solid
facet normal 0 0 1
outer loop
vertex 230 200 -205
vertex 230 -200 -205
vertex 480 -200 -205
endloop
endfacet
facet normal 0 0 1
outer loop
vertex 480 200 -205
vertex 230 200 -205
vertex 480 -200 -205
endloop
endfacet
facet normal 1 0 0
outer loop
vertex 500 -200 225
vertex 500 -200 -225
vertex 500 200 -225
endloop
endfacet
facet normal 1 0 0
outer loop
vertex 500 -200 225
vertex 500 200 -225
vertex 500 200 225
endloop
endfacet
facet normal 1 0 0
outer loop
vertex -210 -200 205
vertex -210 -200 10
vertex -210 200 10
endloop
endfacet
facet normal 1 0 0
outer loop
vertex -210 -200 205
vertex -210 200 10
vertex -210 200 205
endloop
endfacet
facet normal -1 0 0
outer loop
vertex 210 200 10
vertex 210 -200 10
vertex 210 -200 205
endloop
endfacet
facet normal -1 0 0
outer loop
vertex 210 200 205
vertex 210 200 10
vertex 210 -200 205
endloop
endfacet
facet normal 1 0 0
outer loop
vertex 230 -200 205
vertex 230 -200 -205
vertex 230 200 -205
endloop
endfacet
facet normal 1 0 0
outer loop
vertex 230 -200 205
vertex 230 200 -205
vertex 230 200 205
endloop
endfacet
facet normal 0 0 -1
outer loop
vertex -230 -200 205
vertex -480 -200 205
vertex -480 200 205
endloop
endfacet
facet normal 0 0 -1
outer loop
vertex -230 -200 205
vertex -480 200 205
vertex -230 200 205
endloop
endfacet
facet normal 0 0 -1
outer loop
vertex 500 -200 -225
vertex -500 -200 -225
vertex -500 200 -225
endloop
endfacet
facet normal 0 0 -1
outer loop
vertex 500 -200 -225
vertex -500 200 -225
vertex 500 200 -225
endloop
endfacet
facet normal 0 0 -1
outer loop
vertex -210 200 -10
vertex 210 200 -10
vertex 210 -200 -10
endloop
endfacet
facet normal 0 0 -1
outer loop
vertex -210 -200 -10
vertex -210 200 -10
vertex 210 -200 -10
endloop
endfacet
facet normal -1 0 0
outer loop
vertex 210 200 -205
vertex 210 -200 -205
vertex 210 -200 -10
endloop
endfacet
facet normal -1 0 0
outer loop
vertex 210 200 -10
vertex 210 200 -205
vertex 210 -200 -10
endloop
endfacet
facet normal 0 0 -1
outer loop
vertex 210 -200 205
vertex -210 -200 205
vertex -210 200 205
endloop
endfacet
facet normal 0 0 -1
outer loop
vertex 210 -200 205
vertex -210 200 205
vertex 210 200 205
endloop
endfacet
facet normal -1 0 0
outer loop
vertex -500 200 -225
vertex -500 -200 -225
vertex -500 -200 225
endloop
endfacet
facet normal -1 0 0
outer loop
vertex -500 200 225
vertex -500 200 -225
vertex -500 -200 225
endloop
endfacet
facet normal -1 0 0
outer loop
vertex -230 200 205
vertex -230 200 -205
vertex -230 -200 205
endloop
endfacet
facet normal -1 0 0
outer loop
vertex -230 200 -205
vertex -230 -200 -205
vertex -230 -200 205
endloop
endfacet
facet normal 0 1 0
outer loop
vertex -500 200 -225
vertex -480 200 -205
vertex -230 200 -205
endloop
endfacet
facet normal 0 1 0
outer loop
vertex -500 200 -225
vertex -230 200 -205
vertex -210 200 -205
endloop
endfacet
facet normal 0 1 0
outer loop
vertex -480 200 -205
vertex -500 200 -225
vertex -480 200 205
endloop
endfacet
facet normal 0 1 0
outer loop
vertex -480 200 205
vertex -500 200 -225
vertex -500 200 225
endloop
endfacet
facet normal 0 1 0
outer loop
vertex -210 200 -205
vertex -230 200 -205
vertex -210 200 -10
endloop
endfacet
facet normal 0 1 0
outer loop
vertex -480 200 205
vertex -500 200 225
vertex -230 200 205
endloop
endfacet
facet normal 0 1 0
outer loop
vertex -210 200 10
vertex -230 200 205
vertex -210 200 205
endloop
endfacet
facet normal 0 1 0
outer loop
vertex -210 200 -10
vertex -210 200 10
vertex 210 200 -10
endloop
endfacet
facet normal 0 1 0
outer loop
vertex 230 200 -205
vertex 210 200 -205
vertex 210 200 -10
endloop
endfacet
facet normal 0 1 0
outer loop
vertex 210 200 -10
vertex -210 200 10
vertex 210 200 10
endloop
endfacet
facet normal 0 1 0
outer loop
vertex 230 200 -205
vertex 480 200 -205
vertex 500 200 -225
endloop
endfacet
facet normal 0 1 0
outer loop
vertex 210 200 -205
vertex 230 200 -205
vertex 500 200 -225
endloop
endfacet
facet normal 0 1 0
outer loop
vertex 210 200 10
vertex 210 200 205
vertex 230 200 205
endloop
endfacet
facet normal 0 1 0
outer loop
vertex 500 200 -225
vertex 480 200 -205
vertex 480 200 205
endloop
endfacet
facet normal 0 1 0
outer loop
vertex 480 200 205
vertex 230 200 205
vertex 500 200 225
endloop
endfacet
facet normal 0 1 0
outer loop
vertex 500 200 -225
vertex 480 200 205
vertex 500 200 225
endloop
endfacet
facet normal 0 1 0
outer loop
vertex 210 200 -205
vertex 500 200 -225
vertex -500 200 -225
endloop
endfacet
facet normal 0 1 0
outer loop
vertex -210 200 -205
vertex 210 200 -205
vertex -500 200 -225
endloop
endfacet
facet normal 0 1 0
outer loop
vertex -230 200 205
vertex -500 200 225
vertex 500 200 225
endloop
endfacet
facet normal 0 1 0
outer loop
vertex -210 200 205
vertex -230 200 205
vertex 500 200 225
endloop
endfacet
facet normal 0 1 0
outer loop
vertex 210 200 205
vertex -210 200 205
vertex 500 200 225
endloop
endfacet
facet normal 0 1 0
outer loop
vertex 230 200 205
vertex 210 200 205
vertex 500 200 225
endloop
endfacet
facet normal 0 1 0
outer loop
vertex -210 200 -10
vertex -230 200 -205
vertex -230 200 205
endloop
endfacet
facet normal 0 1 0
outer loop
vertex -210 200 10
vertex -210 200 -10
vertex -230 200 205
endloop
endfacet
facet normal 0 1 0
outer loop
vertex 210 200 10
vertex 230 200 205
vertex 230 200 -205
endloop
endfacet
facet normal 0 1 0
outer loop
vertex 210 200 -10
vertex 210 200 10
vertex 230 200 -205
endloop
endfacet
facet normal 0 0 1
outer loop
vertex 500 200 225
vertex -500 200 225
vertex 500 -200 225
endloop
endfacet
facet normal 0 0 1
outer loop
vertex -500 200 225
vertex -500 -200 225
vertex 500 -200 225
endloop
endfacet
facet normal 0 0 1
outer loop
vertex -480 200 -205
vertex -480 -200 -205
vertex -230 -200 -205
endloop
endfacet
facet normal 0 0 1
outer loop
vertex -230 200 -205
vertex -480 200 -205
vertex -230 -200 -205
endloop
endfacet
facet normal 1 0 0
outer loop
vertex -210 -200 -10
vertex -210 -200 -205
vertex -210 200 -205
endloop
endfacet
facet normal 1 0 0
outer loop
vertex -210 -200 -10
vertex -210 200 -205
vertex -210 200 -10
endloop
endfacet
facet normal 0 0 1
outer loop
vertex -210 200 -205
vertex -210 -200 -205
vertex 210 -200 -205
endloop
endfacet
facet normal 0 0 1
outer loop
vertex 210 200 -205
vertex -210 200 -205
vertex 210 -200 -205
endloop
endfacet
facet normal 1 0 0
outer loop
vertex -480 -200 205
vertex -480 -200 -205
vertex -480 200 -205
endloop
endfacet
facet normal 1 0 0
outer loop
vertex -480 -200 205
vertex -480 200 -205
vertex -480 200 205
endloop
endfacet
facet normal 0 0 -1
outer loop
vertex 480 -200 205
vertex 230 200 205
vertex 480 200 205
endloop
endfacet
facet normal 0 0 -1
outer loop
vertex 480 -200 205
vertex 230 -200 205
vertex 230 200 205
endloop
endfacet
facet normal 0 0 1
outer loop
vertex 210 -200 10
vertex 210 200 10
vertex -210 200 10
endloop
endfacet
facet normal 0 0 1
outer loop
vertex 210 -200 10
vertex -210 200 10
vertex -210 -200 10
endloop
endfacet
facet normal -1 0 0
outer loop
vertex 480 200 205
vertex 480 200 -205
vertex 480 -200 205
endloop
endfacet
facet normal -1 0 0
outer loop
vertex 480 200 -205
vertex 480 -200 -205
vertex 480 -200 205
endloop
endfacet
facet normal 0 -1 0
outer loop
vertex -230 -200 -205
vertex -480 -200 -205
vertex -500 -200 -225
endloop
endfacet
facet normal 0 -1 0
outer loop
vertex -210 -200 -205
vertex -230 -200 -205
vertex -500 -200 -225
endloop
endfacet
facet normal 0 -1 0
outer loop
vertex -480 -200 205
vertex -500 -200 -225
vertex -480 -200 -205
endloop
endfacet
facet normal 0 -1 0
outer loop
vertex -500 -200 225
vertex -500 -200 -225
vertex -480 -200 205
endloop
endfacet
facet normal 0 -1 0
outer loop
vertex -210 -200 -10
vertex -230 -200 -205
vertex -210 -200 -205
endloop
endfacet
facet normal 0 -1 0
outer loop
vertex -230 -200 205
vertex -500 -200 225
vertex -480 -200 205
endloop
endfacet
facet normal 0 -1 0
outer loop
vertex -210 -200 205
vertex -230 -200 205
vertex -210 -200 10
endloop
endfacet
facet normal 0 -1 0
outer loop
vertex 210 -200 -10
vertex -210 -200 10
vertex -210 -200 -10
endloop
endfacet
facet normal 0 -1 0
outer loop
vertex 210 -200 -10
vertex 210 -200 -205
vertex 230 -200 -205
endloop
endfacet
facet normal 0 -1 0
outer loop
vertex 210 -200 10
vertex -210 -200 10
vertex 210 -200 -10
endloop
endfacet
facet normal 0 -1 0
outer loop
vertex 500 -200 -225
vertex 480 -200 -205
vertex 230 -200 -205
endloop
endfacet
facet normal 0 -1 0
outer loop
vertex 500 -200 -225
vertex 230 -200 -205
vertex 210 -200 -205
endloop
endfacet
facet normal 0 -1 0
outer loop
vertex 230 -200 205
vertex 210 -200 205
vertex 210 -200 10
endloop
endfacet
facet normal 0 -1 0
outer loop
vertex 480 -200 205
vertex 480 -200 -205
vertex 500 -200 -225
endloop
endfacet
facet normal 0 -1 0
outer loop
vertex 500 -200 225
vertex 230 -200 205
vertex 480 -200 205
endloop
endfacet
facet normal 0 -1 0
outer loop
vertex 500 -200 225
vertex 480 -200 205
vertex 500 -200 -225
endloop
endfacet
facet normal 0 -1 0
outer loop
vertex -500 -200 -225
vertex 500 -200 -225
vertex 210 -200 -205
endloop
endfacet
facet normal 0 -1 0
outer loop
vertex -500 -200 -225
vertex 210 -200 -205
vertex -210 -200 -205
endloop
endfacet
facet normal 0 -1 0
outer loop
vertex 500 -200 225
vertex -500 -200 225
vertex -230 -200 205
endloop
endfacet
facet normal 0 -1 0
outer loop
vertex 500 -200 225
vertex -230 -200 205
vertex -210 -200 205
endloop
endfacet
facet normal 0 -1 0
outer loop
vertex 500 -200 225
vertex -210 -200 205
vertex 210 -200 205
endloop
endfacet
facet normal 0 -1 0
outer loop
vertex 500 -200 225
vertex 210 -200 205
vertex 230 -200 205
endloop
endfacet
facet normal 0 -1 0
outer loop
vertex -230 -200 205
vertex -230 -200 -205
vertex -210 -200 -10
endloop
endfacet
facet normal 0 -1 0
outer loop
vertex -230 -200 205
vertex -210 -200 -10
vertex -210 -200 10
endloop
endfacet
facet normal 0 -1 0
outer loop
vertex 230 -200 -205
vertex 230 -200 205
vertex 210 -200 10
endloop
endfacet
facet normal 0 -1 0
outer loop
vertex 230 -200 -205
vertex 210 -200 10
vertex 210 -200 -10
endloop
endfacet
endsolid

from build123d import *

# Parameters (mm, degrees)
F0_W     = 1000
F0_H     = 450
F0_W_2   = 250
F0_H_2   = 410
F0_W_3   = 420
F1_DEPTH = 200
F2_W     = 400
F2_H     = 20
F3_DEPTH = 420


# Not quite as in the source:
# - a feature names something its author has since deleted; it is built from what else it names


with BuildPart() as f1:
    # F0 (on Front) → F1 (new body, symmetric)
    with BuildSketch(Plane.XZ):
        Rectangle(F0_W, F0_H)
        with Locations((-355, 0)):
            Rectangle(F0_W_2, F0_H_2, mode=Mode.SUBTRACT)
        Rectangle(F0_W_3, F0_H_2, mode=Mode.SUBTRACT)
        with Locations((355, 0)):
            Rectangle(F0_W_2, F0_H_2, mode=Mode.SUBTRACT)
    extrude(amount=F1_DEPTH, both=True)

    # F2 (on face) → F3 (join, through all)
    with BuildSketch(Plane(origin=(210, 0, 0), x_dir=(0, -1, 0), z_dir=(-1, 0, 0))):
        Rectangle(F2_W, F2_H)
    extrude(amount=F3_DEPTH)


solid = f1.part
